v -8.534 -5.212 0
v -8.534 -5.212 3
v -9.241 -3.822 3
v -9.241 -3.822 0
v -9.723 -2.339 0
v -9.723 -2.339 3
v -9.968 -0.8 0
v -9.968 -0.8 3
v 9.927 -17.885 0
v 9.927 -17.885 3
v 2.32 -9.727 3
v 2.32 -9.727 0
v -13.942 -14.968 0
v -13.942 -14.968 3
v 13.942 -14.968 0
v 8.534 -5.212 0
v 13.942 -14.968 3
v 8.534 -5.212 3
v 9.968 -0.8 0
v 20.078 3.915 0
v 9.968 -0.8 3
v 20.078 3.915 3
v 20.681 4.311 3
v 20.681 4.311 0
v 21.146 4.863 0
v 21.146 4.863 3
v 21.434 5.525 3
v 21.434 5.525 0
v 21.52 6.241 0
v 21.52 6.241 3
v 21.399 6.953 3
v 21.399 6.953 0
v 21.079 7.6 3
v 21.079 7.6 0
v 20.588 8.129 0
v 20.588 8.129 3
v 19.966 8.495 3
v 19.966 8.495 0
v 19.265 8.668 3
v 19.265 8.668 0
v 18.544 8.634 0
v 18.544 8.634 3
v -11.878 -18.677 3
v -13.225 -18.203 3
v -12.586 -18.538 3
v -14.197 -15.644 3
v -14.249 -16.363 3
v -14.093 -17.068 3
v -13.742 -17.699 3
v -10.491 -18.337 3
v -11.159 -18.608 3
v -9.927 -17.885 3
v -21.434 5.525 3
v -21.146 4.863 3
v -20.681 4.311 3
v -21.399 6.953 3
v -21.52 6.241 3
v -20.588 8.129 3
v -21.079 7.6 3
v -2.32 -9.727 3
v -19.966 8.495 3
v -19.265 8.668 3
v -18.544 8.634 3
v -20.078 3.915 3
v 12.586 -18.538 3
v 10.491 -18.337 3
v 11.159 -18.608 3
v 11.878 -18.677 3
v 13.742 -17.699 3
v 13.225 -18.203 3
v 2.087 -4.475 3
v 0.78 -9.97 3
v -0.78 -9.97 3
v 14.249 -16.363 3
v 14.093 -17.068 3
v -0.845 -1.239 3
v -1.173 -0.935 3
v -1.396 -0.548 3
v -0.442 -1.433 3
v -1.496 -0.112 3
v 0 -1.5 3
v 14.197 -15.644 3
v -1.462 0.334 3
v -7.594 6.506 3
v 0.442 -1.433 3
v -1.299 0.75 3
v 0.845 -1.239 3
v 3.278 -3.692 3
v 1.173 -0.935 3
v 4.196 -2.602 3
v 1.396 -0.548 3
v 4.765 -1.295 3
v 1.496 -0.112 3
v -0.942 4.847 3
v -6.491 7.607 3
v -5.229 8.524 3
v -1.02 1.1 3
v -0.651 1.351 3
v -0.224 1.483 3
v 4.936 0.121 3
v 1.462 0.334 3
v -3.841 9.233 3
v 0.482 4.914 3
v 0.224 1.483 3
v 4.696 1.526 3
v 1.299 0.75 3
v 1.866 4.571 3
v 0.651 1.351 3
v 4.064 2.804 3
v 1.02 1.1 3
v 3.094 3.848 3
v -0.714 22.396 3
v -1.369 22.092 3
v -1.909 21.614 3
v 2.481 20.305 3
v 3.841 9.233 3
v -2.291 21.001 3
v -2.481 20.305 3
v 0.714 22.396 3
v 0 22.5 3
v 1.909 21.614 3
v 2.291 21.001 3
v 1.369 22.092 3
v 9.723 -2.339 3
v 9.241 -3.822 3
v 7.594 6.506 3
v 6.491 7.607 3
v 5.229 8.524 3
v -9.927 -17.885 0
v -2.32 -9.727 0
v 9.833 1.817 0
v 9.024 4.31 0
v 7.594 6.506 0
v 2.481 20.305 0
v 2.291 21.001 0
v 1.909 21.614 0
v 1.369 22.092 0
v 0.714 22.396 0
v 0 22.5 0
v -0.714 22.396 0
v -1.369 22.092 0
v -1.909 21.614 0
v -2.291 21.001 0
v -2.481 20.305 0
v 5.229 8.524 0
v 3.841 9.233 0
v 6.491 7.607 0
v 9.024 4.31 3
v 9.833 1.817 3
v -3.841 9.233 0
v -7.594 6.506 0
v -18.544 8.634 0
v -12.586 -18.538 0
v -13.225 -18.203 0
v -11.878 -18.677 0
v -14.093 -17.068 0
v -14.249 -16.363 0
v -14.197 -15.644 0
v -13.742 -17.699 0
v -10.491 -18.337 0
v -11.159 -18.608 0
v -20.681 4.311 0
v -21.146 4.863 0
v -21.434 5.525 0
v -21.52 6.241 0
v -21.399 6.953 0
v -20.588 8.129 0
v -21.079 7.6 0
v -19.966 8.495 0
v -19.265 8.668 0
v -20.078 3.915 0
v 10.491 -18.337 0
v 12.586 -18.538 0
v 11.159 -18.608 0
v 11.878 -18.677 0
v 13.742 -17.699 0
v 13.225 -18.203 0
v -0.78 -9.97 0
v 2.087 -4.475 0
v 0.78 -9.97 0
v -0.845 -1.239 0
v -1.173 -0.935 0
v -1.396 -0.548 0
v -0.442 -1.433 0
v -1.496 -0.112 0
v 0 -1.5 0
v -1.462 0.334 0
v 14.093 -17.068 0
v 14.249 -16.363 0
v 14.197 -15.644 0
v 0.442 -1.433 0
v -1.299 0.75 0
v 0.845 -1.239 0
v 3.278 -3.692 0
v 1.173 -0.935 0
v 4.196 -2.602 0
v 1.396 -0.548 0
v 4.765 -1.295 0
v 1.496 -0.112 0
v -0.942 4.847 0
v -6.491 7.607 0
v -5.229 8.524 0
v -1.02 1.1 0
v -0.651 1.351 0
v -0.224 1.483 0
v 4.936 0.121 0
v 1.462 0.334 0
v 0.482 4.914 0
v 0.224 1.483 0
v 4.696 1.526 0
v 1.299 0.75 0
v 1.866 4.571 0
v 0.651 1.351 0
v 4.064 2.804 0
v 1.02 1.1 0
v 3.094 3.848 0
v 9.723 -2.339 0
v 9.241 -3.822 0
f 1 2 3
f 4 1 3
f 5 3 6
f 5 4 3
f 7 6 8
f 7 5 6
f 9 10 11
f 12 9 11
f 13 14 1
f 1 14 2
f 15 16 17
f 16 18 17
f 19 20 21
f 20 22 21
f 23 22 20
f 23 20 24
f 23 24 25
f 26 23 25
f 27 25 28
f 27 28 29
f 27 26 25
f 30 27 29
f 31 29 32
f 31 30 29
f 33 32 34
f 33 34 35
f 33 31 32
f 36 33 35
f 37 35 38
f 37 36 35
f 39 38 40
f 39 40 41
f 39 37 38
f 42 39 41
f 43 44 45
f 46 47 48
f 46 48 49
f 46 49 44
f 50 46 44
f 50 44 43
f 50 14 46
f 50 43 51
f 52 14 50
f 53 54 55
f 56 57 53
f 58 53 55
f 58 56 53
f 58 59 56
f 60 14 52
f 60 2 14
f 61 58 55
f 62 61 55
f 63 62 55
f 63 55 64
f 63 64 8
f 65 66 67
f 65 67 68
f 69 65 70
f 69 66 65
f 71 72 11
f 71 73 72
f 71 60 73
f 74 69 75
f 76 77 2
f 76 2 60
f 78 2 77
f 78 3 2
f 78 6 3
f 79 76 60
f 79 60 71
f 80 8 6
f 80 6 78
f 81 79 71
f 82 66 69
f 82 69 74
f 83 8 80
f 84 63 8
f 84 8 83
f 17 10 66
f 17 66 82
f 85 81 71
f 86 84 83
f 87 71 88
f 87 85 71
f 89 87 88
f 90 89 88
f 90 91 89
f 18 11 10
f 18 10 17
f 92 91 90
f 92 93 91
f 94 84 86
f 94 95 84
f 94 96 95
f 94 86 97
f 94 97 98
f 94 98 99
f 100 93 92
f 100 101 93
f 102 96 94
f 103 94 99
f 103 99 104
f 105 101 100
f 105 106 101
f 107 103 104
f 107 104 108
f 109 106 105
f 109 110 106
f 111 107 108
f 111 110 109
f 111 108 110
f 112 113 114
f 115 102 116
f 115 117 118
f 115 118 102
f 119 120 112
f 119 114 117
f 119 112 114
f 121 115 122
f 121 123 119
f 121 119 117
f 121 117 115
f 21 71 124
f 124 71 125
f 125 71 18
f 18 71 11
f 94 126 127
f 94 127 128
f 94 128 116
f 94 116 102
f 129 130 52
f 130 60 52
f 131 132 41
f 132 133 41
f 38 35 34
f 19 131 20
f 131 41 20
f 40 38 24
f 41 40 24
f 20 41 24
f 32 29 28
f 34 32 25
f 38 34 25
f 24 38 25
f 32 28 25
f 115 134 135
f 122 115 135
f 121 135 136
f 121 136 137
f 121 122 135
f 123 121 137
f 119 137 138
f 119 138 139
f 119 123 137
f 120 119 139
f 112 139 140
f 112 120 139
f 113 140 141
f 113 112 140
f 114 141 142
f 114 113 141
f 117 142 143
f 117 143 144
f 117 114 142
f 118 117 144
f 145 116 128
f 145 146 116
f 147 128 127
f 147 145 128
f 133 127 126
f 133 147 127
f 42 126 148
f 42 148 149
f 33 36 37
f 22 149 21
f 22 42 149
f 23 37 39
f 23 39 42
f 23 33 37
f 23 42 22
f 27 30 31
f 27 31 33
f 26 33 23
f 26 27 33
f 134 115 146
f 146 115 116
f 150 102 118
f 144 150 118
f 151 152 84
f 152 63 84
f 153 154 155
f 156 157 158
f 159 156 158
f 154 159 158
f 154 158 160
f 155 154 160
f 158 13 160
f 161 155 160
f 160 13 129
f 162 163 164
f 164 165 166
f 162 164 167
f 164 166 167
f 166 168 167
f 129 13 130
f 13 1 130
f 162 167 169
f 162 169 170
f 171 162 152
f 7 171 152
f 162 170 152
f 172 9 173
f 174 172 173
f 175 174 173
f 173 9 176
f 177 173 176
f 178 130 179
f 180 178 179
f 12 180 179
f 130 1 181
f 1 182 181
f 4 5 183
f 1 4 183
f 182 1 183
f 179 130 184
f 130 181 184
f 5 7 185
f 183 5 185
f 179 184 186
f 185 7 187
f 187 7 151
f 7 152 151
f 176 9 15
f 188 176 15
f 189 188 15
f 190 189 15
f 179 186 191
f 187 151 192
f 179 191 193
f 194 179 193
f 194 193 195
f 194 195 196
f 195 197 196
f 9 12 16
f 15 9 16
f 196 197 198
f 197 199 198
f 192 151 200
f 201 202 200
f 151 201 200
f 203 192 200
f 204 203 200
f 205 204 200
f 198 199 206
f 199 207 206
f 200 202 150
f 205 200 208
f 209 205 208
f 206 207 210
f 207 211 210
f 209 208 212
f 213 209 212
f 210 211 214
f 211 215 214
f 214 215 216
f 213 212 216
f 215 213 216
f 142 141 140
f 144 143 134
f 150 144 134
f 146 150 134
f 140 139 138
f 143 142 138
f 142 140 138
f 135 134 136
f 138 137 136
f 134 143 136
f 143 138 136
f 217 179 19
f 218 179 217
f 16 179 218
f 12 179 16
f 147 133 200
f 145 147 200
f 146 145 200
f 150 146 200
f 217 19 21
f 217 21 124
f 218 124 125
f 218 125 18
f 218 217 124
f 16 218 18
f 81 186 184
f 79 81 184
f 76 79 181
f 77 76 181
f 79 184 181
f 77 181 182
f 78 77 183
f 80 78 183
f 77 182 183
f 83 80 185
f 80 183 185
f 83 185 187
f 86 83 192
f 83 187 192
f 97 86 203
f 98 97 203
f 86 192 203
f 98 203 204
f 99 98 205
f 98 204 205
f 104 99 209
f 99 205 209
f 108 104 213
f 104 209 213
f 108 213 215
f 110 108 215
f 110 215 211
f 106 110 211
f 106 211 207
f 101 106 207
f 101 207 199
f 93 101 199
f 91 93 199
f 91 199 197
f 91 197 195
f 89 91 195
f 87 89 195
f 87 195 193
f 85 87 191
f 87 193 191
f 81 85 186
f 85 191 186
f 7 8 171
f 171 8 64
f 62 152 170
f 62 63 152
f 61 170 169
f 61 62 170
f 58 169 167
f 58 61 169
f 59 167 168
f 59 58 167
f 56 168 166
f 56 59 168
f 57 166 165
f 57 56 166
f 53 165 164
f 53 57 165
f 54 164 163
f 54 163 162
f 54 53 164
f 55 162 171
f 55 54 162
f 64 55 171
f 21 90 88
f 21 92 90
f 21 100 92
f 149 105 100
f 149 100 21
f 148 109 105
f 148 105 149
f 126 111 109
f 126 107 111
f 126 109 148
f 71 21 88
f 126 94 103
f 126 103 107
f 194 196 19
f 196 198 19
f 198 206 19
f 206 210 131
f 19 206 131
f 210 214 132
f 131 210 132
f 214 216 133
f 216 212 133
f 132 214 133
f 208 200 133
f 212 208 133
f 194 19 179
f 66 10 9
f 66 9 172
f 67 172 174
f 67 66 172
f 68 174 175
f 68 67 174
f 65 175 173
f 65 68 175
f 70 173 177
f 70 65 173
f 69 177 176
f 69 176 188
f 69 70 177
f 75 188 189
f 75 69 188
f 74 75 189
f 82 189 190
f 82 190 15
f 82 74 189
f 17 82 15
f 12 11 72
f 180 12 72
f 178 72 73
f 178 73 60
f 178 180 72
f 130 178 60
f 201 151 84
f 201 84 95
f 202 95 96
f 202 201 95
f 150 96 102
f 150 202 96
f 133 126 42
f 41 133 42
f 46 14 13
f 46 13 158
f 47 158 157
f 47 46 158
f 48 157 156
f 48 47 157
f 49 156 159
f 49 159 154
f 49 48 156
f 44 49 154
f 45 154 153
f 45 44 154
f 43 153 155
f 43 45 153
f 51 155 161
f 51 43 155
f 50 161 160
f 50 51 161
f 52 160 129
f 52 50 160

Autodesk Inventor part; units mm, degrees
ref_plane "YZ Plane" through (0, 0, 0) normal (1, 0, 0) x (0, 1, 0)
ref_plane "XZ Plane" through (0, 0, 0) normal (0, 1, 0) x (-1, 0, 0)
ref_plane "XY Plane" through (0, 0, 0) normal (0, 0, 1) x (1, 0, 0)
sketch "Sketch1" plane through (0, 0, 0) normal (0, 0, 1) x (1, 0, 0)
  circle A0 centre (0, 0) radius 10
  dimension "d0" = 20
extrude "Extrusion1" add sketch "Sketch1" along normal blind 3
sketch "Sketch2" plane through (0, 0, 3) normal (0, 0, 1) x (1, 0, 0)
  point P0 (0, 0)
  point P1 (0, 0)
hole "Hole1" at (0, 0, 3) direction (0, 0, -1) diameter 3 end through all
sketch "Sketch4" plane through (0, 0, 3) normal (0, 0, 1) x (1, 0, 0)
  circle A0 centre (0, 0) radius 10 projected
  circle A1 centre (0, 20) radius 2.5
  circle A2 centre (0, 0) radius 1.5 projected
  circle A3 centre (0, 0) radius 4.9374
  line L0 (-4.9006, 0.6017) -> (-2.4814, 20.3047)
  line L1 (2.4814, 20.3047) -> (4.9006, 0.6017)
  dimension "d17" = 20
  dimension "d25" = 5
  dimension "d26" = 20
  dimension "d28" = 14
extrude "Extrusion2" add sketch "Sketch4" against normal up to surface (3 mm away) contours L1 A3 L0 A0 | A0 L0 A1 L1 | A1 picked at (-0.6528, 8.2479)
pattern_circular "Circular Pattern1" count 5 over 360 about axis through (0, 0, -10) along (0, 0, 1) of "Extrusion2"
properties part number "Selection_Gear 1" material "Nylon 6/6"
